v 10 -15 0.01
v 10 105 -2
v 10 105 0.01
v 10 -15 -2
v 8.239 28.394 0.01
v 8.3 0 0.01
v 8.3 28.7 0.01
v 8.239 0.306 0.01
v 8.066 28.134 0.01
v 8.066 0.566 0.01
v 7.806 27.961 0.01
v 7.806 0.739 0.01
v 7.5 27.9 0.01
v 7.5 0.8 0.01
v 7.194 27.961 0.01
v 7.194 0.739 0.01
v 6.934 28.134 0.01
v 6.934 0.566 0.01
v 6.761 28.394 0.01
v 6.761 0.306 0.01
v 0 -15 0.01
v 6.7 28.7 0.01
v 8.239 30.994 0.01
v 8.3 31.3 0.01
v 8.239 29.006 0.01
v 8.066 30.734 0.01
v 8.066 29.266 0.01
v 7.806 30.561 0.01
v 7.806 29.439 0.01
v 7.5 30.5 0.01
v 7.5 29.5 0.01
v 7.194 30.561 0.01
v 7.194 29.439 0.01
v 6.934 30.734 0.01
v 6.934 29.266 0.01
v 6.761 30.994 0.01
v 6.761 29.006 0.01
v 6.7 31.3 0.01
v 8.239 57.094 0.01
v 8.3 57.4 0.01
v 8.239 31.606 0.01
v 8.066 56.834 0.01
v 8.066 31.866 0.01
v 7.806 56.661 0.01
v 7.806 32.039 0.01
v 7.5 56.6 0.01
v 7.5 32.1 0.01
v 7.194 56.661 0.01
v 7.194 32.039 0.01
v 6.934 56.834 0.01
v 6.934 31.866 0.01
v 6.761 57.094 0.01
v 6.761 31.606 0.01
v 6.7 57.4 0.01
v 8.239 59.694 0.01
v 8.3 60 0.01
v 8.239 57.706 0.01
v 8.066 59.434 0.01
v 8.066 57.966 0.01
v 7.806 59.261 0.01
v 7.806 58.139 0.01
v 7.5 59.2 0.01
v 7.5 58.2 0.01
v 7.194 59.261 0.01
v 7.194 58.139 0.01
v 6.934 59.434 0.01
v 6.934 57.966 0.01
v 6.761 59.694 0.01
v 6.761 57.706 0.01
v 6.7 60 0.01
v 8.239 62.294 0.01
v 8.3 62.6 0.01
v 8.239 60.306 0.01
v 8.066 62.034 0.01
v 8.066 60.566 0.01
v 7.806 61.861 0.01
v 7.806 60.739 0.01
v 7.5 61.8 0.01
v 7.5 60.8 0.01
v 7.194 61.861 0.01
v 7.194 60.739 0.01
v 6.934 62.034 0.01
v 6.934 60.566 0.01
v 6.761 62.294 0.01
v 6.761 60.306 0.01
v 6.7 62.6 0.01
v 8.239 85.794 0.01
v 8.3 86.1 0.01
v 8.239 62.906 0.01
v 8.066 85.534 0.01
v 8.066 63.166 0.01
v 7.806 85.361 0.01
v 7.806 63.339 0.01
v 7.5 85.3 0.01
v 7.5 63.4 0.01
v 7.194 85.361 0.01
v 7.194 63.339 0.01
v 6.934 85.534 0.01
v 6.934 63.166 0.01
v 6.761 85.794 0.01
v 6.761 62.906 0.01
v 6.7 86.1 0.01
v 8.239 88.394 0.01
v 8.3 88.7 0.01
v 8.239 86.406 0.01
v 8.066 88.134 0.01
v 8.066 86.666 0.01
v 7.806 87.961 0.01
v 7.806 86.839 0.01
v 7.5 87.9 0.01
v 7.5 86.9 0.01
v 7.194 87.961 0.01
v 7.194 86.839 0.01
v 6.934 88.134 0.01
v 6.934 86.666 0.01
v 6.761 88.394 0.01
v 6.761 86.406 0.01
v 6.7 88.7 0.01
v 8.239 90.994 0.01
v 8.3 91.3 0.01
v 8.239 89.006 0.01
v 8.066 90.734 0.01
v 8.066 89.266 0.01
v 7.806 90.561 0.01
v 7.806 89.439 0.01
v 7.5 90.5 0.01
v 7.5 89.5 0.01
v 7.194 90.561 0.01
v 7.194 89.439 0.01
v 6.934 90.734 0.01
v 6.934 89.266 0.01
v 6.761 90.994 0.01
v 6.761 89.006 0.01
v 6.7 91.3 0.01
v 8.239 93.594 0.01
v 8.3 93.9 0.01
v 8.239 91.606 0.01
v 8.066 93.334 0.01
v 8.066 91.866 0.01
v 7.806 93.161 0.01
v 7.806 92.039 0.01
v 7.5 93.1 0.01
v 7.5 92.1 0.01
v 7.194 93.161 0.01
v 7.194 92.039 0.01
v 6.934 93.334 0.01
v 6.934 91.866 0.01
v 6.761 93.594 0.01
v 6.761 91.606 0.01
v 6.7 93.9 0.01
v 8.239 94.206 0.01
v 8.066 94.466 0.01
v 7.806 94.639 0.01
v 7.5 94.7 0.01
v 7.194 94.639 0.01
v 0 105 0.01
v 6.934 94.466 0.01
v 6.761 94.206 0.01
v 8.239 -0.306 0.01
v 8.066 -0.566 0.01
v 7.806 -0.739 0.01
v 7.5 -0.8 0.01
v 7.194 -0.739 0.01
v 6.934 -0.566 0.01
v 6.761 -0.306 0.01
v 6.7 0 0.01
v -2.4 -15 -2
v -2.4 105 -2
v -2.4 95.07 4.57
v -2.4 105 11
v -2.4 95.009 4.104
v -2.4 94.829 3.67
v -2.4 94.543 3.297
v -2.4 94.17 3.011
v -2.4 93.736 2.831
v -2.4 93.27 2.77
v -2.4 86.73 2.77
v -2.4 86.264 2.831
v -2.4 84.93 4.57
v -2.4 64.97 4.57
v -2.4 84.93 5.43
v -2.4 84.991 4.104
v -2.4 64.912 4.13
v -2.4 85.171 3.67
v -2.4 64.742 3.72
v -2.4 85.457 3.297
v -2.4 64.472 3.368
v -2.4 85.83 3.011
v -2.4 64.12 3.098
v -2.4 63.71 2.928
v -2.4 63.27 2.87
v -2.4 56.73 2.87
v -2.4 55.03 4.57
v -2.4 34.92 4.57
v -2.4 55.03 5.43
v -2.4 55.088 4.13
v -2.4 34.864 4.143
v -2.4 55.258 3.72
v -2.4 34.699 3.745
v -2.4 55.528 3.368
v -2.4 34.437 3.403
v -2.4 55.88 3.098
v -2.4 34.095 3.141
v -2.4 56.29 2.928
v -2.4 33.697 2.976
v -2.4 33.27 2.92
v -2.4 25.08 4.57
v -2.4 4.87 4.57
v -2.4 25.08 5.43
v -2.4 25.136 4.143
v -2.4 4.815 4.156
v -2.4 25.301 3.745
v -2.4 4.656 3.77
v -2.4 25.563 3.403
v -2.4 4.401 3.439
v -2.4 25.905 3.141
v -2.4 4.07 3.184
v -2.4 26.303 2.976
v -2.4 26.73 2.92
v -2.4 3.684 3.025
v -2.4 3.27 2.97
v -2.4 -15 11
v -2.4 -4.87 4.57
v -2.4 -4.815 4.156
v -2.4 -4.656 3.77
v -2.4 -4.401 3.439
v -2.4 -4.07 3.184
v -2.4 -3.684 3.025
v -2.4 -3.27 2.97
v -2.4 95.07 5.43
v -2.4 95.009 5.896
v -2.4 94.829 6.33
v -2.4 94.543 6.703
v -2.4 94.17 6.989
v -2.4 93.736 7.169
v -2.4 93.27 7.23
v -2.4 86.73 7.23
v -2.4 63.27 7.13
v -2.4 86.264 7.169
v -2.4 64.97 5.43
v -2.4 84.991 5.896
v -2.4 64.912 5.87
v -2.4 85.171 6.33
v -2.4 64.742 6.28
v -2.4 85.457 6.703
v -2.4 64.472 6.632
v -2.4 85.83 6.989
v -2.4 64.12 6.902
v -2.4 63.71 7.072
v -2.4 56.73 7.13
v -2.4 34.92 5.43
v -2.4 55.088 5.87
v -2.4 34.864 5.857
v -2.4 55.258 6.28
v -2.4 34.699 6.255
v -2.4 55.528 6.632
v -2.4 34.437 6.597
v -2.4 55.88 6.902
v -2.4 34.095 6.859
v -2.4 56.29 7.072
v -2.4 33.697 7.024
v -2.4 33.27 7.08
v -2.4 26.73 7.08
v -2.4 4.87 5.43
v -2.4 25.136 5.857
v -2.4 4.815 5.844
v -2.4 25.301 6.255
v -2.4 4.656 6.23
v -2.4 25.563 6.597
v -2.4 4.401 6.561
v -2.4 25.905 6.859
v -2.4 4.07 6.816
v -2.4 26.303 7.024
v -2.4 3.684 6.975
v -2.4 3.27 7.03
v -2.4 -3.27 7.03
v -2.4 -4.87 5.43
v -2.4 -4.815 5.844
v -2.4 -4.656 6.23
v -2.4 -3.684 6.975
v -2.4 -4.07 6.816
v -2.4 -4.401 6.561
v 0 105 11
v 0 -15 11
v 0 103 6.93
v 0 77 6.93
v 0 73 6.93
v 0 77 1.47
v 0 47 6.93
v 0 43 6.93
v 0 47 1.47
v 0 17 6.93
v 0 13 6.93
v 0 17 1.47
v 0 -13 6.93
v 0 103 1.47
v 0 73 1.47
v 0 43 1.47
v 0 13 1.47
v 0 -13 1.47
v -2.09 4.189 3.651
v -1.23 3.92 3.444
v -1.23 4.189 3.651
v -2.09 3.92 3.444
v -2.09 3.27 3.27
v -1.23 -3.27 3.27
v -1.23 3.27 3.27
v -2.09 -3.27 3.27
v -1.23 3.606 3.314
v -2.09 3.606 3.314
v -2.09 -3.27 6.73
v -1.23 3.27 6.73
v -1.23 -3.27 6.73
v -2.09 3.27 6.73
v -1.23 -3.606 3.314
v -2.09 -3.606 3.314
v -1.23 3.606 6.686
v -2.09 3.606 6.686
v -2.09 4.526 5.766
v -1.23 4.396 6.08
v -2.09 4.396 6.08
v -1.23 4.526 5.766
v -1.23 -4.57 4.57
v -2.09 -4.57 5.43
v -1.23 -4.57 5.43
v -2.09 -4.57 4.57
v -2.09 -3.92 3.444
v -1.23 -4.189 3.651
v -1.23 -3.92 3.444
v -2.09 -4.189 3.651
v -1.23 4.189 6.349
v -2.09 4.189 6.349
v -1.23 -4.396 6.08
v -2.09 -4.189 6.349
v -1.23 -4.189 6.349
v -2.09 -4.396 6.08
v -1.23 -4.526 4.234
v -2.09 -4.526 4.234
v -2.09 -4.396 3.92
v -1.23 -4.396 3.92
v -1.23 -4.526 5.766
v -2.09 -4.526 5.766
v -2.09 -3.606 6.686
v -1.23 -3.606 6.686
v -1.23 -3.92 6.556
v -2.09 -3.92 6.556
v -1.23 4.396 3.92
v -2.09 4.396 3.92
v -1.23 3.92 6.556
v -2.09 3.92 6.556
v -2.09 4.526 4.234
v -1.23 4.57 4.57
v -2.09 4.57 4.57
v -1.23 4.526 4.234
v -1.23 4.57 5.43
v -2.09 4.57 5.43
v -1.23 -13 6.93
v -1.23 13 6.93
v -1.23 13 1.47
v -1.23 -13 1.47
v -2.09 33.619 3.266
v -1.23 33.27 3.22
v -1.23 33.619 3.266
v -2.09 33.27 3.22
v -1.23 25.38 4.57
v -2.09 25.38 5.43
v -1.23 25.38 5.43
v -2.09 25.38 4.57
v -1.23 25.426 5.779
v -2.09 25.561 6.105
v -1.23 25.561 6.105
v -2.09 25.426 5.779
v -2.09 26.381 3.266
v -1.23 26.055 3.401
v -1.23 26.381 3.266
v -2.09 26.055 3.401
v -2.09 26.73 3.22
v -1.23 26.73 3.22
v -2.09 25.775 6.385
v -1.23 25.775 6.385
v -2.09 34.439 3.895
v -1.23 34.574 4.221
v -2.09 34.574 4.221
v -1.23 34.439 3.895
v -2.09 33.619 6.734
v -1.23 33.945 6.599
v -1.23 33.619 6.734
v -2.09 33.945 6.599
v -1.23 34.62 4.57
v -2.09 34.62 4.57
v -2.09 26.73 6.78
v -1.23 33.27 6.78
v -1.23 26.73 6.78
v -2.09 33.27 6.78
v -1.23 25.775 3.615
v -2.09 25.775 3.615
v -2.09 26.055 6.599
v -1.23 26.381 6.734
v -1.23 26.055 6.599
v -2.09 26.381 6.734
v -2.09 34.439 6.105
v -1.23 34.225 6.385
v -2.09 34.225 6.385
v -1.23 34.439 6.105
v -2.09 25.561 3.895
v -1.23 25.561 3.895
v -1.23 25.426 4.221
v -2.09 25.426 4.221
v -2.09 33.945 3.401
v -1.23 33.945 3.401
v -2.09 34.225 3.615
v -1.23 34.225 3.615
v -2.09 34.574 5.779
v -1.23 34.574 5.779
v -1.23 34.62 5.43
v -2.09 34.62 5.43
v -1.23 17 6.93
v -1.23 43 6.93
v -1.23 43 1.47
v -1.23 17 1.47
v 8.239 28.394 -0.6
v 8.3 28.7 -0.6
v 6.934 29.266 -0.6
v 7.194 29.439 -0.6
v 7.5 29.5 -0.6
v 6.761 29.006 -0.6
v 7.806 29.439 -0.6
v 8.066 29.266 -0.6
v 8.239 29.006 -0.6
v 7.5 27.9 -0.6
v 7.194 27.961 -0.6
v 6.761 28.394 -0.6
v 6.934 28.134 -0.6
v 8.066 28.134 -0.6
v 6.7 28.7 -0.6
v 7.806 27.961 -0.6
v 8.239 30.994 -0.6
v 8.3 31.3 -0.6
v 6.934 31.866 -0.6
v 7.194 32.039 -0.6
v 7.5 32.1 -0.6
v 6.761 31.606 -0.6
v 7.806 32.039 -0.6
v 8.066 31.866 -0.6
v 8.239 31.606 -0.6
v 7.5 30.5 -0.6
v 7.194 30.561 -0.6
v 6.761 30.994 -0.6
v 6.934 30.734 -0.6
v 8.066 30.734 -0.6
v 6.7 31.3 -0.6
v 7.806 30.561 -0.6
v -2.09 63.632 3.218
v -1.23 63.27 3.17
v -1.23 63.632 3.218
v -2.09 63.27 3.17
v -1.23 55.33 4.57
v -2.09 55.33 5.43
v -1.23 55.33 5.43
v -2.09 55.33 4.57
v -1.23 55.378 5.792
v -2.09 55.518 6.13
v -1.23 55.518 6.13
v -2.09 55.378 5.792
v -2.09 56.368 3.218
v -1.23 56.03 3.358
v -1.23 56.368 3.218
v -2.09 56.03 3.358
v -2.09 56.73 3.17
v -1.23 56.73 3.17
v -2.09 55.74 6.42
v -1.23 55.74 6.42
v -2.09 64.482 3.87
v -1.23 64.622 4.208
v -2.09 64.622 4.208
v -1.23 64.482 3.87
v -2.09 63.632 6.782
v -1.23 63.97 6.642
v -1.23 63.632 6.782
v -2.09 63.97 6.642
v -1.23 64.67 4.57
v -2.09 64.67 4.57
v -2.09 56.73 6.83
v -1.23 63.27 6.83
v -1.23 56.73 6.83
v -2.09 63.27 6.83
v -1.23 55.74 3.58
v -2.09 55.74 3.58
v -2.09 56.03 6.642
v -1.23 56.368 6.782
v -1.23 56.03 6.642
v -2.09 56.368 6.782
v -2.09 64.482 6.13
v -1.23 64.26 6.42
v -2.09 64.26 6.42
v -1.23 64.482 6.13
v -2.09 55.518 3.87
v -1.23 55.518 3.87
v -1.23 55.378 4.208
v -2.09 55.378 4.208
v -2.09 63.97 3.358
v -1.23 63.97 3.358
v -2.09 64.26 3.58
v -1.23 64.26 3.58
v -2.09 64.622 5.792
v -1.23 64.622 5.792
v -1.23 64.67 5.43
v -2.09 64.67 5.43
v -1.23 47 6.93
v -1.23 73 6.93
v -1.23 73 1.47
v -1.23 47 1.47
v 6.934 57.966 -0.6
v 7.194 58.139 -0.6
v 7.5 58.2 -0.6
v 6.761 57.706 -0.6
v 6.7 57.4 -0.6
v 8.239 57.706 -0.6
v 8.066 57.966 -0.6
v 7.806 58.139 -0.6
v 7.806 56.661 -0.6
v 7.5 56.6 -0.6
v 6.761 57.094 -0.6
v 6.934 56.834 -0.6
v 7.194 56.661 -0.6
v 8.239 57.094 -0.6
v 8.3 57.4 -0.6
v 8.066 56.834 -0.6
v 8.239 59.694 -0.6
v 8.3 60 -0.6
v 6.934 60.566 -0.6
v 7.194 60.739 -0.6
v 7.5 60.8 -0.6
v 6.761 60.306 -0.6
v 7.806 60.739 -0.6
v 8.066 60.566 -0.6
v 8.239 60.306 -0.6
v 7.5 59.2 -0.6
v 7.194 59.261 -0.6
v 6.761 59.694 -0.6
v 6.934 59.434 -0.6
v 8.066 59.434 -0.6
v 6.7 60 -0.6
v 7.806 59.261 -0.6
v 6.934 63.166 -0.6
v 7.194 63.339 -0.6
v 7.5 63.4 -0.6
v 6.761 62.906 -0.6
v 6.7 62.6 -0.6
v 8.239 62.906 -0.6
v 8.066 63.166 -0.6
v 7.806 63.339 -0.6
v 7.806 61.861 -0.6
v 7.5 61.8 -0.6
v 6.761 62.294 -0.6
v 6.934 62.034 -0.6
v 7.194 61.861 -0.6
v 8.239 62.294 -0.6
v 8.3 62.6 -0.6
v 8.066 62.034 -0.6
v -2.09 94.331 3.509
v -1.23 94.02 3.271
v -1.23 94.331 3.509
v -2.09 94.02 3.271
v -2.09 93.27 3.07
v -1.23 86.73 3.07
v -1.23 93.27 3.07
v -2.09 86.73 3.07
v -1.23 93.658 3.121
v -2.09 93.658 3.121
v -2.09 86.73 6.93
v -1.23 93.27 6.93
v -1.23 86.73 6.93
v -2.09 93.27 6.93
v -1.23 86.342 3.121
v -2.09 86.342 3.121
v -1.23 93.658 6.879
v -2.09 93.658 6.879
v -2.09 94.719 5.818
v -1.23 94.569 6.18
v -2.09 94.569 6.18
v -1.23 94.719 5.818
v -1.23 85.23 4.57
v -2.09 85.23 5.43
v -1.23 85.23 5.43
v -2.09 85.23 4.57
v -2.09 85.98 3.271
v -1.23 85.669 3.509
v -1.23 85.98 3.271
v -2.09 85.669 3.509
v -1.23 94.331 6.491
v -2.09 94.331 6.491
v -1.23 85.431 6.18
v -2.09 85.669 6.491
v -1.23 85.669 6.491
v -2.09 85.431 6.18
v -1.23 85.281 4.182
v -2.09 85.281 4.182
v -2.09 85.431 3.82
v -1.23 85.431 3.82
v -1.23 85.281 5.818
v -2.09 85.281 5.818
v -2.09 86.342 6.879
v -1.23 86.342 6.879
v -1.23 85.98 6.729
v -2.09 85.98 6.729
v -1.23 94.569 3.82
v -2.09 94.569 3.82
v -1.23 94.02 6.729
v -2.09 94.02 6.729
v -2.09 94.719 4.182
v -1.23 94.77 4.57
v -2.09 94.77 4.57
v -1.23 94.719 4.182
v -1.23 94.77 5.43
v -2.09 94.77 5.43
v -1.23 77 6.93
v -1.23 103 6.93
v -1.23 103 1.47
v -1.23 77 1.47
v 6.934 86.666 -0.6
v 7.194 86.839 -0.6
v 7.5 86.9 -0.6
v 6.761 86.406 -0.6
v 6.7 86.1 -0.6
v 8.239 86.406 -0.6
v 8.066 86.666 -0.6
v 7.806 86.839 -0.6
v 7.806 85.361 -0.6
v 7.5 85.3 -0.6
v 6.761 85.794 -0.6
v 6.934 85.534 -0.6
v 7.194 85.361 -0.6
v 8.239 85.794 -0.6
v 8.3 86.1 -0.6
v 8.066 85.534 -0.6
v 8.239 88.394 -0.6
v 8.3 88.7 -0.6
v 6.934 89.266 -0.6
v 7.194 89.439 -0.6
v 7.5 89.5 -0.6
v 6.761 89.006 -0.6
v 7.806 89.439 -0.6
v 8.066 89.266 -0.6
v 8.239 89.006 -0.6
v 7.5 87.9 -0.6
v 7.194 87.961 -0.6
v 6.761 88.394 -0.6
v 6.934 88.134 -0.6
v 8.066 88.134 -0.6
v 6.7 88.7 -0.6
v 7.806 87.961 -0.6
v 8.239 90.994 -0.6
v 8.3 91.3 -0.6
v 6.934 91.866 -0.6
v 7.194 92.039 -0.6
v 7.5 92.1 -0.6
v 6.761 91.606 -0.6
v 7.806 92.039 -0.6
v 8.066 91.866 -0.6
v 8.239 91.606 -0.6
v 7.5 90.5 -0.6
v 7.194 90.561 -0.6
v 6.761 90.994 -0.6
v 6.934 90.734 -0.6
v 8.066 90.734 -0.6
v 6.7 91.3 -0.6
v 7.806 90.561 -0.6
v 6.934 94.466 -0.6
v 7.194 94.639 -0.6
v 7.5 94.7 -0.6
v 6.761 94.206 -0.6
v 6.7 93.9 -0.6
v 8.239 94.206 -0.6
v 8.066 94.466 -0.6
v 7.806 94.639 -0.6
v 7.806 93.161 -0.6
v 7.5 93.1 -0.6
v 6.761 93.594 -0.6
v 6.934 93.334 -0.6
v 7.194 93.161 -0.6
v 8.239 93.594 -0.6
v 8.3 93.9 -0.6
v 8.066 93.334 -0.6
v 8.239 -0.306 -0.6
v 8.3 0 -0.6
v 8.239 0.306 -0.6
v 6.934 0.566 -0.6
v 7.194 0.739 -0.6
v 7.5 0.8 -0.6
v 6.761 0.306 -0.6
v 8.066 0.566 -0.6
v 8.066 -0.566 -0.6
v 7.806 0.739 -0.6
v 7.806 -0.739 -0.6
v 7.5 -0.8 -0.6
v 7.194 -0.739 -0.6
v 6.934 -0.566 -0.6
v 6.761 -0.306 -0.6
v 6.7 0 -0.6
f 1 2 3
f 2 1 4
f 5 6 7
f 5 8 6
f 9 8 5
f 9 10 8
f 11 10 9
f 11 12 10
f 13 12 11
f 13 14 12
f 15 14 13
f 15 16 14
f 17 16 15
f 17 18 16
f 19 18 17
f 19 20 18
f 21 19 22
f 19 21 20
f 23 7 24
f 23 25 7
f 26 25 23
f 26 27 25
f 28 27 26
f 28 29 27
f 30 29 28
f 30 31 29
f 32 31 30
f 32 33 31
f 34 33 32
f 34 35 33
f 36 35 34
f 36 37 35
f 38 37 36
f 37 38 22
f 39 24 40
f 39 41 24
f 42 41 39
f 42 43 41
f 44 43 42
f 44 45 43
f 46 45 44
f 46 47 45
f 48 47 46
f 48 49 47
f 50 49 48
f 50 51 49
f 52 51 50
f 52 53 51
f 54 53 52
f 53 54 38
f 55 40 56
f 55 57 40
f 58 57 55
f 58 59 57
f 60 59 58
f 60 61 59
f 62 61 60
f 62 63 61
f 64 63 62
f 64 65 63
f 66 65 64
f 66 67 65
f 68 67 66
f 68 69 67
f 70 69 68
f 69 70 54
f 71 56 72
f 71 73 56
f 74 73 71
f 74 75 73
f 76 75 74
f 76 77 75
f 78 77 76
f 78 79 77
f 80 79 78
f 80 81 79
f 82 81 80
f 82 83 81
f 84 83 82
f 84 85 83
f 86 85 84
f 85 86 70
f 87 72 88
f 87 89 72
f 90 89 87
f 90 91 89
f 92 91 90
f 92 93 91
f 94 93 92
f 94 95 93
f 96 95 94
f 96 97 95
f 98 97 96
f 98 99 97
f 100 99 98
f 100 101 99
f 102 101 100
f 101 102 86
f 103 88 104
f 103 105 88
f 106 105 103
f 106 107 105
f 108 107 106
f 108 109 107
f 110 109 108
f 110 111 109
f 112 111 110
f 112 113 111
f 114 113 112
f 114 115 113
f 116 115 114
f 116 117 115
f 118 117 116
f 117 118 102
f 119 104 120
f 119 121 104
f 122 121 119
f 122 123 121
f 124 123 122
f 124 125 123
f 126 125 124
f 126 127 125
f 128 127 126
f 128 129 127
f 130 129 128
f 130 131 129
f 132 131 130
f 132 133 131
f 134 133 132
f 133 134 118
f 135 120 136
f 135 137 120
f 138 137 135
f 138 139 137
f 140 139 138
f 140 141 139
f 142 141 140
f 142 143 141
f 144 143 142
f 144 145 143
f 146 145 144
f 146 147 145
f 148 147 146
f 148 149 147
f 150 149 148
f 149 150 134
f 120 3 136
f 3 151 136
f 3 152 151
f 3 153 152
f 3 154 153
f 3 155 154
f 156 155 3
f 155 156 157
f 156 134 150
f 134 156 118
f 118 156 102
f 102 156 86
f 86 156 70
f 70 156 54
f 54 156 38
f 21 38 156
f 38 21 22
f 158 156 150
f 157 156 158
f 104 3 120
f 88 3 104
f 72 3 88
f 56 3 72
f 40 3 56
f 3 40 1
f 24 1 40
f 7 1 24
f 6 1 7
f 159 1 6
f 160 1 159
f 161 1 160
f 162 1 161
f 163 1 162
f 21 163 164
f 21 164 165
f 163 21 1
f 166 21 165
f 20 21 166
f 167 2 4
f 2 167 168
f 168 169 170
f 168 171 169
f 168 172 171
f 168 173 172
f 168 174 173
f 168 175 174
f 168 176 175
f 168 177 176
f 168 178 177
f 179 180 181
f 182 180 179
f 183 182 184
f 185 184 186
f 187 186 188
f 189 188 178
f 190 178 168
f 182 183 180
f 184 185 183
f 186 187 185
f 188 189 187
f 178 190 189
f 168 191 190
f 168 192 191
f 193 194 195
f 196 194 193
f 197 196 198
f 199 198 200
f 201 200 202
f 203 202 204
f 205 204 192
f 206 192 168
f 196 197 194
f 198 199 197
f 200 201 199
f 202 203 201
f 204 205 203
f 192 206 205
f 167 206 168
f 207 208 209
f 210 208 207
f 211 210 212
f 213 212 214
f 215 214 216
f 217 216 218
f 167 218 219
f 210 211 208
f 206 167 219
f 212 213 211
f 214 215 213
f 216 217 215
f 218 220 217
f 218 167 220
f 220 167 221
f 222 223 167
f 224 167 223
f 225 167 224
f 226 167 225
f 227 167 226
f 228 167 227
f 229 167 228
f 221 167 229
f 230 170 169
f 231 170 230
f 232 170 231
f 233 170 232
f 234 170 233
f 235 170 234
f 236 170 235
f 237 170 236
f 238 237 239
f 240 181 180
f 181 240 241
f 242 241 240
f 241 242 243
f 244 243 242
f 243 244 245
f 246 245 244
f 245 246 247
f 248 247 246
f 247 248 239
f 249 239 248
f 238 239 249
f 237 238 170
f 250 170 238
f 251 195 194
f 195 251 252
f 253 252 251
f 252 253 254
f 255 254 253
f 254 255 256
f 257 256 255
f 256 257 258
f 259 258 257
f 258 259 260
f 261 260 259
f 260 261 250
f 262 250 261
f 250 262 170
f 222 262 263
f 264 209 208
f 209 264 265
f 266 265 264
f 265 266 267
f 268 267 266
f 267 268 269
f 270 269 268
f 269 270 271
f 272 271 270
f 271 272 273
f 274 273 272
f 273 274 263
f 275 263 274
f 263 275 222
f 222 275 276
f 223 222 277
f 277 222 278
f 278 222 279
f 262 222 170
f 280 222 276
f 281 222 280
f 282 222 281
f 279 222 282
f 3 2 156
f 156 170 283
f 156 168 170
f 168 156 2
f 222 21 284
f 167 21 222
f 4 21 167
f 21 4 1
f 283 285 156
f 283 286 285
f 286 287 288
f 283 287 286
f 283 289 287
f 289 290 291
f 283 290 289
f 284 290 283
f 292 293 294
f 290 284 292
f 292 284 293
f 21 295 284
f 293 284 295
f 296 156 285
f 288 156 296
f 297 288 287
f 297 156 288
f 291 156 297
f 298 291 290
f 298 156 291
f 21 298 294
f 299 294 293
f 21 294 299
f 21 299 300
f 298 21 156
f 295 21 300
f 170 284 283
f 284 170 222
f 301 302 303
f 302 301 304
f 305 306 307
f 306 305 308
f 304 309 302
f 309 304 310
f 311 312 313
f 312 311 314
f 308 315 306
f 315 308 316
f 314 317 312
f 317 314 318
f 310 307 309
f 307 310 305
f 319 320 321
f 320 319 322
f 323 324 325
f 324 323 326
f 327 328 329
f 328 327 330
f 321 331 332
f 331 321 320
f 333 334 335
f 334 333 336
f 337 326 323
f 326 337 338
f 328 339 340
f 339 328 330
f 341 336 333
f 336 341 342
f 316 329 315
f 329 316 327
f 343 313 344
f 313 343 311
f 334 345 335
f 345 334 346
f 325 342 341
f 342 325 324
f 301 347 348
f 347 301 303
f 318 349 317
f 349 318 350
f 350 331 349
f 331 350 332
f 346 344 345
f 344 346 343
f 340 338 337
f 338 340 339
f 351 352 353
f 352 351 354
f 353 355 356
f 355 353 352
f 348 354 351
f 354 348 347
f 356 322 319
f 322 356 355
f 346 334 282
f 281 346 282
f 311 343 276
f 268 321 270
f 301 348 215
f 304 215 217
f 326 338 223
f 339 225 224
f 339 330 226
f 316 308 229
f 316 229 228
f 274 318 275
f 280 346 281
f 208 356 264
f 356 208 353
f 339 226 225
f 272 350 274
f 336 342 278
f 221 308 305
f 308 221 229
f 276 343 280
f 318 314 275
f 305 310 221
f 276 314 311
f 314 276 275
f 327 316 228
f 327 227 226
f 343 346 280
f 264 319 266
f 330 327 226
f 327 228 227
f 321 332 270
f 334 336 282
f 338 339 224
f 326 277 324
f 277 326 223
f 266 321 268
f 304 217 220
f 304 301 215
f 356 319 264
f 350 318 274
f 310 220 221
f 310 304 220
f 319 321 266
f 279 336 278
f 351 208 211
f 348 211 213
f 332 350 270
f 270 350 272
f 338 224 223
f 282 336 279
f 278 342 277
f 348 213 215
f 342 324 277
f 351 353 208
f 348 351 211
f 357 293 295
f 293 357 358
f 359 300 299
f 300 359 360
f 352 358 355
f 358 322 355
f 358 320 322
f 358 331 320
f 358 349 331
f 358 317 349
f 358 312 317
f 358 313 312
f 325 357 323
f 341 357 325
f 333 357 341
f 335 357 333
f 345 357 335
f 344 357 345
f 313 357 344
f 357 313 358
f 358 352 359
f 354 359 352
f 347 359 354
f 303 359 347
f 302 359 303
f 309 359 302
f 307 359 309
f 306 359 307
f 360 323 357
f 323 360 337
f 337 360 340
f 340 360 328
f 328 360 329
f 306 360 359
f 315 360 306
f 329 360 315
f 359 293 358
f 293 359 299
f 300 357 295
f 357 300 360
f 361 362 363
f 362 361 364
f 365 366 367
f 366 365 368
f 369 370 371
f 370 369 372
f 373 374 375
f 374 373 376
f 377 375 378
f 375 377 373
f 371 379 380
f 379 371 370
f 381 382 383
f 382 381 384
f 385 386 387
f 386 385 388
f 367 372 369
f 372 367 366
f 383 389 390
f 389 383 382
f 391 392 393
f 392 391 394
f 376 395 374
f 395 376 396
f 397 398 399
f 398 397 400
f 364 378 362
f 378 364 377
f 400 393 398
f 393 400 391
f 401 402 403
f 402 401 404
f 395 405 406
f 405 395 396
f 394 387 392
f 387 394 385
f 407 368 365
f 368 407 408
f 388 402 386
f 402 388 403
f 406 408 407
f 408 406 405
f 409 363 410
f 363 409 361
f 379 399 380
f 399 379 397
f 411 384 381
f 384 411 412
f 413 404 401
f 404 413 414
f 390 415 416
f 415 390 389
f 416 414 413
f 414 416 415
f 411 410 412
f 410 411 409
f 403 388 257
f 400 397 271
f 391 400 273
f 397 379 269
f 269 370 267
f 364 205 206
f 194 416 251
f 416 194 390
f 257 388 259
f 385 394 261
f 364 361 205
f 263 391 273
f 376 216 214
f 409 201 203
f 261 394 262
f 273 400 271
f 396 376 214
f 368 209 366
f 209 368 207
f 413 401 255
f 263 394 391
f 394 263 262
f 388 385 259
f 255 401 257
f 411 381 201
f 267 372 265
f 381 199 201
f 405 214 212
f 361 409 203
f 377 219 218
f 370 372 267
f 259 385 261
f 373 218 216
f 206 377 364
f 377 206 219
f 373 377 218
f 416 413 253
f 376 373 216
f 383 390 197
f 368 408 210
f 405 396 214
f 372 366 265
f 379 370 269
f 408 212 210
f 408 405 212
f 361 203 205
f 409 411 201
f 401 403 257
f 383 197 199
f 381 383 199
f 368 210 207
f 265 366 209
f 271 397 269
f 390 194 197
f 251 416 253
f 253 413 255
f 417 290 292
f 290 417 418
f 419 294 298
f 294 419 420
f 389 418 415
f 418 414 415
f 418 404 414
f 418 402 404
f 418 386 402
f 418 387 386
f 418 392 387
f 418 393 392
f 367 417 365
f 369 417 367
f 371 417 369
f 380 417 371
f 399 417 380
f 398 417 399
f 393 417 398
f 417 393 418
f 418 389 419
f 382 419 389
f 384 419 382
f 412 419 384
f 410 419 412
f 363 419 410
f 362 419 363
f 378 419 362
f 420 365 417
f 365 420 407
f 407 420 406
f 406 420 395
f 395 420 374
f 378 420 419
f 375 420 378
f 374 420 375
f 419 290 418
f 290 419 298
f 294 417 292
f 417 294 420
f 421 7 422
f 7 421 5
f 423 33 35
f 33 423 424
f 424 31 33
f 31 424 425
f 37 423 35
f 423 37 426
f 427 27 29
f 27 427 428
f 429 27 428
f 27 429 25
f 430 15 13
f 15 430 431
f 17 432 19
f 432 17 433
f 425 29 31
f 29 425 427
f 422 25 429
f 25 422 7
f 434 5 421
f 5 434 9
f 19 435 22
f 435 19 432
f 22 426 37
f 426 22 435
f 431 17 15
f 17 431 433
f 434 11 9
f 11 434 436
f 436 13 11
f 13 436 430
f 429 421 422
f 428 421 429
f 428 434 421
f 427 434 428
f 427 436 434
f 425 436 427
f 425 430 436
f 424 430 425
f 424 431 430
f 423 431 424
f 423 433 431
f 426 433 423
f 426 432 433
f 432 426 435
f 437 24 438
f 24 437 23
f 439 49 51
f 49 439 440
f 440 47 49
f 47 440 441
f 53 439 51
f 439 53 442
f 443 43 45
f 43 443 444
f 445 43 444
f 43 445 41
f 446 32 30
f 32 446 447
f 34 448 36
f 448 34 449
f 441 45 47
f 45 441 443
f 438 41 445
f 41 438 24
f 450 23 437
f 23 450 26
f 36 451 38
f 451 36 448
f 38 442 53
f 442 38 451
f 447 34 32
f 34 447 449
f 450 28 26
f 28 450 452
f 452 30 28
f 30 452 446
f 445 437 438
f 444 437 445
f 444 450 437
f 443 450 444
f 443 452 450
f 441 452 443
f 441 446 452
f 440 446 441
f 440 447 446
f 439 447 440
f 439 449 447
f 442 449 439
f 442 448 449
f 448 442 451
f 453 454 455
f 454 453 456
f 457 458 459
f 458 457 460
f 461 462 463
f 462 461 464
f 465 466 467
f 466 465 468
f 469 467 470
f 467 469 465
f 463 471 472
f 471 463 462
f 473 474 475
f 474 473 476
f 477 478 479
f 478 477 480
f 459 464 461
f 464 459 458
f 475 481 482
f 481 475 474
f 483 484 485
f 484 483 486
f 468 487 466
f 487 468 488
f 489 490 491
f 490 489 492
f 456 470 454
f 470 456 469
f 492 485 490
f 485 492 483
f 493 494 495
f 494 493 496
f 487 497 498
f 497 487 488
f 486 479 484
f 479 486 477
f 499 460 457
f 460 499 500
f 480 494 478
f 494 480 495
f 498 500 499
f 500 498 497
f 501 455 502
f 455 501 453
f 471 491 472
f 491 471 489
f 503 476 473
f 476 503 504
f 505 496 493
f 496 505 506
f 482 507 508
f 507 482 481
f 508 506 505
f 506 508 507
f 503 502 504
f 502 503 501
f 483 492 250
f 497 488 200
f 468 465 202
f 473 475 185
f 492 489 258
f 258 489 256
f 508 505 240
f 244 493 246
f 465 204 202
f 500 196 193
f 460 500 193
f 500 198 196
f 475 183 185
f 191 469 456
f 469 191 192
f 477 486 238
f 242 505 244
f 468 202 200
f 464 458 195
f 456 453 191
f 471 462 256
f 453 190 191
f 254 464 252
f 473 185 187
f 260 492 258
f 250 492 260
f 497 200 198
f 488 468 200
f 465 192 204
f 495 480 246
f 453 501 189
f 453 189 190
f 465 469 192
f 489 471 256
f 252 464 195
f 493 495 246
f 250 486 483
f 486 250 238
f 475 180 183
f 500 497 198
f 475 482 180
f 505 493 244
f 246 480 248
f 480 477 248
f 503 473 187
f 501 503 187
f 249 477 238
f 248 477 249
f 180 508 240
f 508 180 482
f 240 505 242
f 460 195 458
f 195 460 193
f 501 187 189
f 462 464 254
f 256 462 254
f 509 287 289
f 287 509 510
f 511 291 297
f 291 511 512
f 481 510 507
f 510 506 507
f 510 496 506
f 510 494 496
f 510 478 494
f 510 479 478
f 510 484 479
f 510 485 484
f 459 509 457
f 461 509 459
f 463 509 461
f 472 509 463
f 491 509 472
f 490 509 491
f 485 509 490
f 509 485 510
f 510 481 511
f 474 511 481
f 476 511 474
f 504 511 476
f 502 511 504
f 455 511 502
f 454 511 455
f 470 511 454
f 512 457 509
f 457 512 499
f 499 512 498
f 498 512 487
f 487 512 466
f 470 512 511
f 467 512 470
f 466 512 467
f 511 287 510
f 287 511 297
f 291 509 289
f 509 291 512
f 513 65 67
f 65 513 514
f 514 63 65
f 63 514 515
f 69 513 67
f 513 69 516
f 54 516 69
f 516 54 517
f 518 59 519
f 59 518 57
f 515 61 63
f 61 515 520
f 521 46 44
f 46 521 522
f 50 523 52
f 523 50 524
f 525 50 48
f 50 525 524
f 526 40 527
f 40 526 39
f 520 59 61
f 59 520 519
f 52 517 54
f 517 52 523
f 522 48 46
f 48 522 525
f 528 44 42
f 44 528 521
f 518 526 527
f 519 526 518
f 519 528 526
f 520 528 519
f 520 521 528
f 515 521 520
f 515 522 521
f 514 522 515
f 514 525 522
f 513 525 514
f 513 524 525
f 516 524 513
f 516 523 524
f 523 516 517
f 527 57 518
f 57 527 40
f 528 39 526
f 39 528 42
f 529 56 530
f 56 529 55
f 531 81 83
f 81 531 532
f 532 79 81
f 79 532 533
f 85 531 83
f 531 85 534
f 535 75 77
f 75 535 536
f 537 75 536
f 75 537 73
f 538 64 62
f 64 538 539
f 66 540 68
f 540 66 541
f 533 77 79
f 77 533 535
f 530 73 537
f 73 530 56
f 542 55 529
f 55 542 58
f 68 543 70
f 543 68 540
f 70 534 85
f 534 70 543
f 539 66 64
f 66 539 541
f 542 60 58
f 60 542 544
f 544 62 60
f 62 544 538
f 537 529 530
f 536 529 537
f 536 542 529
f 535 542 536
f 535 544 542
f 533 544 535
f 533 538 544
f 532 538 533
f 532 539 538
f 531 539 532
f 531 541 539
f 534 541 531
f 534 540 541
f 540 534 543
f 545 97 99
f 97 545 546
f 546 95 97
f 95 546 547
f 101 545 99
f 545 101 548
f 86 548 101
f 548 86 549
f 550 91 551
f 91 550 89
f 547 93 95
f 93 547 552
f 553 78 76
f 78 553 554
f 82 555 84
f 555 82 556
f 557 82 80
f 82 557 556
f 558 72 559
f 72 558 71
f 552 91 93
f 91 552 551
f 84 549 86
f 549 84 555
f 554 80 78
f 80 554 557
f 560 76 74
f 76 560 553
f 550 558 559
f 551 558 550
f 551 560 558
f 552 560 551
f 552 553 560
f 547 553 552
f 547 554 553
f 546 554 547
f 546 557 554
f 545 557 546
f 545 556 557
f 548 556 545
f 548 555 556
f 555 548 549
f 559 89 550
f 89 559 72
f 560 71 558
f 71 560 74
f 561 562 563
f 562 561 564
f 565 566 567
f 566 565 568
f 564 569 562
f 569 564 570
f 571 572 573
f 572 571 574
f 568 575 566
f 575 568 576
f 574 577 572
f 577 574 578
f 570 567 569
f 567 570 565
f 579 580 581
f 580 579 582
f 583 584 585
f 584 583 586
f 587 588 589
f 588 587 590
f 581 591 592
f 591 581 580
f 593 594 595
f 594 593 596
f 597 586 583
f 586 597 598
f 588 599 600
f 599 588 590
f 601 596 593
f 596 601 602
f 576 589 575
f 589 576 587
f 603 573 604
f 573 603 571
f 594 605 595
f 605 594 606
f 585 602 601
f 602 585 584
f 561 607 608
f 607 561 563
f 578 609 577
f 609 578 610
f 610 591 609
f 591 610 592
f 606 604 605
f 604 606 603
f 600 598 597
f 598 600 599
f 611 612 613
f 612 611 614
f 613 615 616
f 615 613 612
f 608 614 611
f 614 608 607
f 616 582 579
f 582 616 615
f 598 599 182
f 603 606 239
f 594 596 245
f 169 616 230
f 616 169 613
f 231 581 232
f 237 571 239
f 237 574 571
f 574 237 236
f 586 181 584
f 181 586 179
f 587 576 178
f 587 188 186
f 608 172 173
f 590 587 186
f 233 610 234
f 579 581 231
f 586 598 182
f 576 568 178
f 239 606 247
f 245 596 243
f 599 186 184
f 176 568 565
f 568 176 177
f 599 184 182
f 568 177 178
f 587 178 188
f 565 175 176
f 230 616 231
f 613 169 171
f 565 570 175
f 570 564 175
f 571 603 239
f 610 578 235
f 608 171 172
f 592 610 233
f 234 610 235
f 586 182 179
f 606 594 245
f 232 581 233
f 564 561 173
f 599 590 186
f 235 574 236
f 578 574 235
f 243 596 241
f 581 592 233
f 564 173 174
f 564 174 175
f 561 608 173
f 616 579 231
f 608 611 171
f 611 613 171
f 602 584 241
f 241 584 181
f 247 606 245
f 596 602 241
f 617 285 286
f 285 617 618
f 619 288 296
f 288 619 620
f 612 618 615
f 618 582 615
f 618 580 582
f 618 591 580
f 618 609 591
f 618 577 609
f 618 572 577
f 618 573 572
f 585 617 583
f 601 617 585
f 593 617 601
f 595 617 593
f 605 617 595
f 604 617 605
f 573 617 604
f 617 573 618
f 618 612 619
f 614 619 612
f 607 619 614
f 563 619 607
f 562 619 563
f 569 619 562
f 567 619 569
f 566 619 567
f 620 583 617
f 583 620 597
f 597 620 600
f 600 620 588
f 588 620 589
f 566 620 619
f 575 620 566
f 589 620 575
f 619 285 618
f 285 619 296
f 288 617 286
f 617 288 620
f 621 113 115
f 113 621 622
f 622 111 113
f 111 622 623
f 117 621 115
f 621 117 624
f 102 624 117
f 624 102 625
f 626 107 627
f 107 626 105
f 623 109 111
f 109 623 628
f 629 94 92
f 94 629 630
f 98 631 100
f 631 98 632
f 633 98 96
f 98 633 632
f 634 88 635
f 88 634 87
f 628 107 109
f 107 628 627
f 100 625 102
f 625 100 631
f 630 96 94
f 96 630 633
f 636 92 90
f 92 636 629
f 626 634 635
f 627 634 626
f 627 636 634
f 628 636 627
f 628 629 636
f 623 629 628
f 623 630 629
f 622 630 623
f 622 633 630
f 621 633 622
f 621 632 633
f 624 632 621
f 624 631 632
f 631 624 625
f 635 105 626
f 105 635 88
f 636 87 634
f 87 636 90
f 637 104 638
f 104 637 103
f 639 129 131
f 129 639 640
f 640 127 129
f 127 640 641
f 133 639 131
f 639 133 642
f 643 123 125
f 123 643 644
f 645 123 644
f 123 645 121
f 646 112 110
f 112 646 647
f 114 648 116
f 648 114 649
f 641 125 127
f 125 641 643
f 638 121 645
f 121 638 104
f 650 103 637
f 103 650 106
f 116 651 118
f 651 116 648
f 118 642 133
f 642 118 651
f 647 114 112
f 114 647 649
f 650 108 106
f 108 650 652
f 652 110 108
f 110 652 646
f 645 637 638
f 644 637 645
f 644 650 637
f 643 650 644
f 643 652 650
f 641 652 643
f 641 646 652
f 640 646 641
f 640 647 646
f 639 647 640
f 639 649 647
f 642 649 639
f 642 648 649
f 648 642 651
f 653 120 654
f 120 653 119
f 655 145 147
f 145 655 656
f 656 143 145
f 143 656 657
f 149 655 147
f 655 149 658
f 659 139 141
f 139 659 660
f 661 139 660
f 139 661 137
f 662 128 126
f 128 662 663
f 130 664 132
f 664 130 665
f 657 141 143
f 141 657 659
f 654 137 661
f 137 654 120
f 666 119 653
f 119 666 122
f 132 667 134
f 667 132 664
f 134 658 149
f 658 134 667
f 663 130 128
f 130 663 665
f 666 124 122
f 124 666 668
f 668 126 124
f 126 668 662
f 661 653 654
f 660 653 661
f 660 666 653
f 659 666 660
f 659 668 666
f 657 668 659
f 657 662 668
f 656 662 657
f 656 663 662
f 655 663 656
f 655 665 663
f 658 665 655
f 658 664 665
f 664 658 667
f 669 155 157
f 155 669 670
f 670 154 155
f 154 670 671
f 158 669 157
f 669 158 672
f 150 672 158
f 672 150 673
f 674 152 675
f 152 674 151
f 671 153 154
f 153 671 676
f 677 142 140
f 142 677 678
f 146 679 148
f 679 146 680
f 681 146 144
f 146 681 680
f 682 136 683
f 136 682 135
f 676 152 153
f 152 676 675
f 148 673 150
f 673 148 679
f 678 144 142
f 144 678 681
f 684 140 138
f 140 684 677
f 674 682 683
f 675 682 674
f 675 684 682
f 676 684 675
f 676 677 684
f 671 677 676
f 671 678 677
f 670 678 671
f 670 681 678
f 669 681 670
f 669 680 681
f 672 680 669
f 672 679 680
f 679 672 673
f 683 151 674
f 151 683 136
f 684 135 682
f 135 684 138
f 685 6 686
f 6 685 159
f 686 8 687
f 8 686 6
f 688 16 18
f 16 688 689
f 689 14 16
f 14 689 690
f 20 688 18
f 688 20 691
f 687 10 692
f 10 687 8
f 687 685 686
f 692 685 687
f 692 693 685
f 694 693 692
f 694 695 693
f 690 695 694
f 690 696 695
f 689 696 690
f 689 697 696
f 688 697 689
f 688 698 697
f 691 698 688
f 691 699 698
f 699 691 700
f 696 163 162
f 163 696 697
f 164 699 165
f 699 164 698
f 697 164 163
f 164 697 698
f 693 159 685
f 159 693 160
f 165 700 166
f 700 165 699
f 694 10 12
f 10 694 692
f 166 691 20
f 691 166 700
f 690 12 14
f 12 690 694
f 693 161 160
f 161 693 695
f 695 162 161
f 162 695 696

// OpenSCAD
// file: ../../util/marks.scad
//-----------------------------------------------------------------------
// Marks for fit pieces: n dots in a row, engraved into a face, so each
// variant can be told apart after printing. Origin: centre of the row, on
// the face; the dots cut down into -Z. Units: mm.
//-----------------------------------------------------------------------

markDotDia   = 1.6;
markDotPitch = 2.6;
markDotDepth = 0.6;

module markDots(n)
{
  for (i = [0 : n - 1])
    translate([(i - (n - 1)/2)*markDotPitch, 0, -markDotDepth])
      cylinder(d = markDotDia, h = markDotDepth + 1, $fn = 16);
}
// file: usb-c-port.scad
//-----------------------------------------------------------------------
// USB-C port through a wall, flush: the socket's metal shell sits in a
// close-fitting pocket in the wall, walled in on all four sides, its face
// level with the outside. The cable seats the way it does on a laptop.
//
// A board's socket only overhangs the board edge by a mm or so, less than
// the wall. So the board's end tucks into a shallow relief in the wall's
// inner face, the width of the board, leaving the wall round the socket
// thin enough for the face to reach the outside. When that would leave less
// than usbcMinWall (a socket that barely overhangs), the face sits back from
// the outside instead: usbcRecess() says how far.
//
// Modules, all in the same frame:
//   usbcGhost()     the socket and the board's end, for previews
//   usbcWallCut()   subtract from the wall: socket pocket and board relief
//
// Frame: origin on the floor top at the wall's inner face, under the socket's
// axis. +X into the box, Z up. The wall is X = -wall .. 0. The board is
// component side up, socket on top (top-mount, as on the FireBeetle, C3 Super
// Mini and S3 DevKitC). Units: mm.
//
// usbcBoardEdgeX() gives where the board's edge lands (negative: inside the
// wall), so a holder can put its posts or pocket to match.
//-----------------------------------------------------------------------

//-- The socket: USB-C receptacle shell (USB-IF 8.34 x 2.56 plug, receptacle shell ~8.94 x 3.26)
usbcShellW     = 8.94;
usbcShellH     = 3.26;    // CAL per board: measured 3.2 on the FireBeetle
usbcShellR     = 1.2;     // CAL: end radius. Full round would be 1.63; most shells are squarer
usbcShellDepth = 7.35;    // face to back

//-- The pocket
usbcClearance  = 0.15;    // CAL: per side, shell to pocket. Set by the fit piece
usbcMinWall    = 1.0;     // thinnest wall left round the socket
usbcReliefGap  = 0.3;     // board relief over the board, each side and above/below
usbcChamfer    = 0.3;     // lead-in on the outside edge

//-- How far the socket face sits back from the outside: 0 (flush) unless the socket
//-- overhangs the board edge by less than usbcMinWall
function usbcRecess(overhang, minWall = usbcMinWall) = max(0, minWall - overhang);
//-- X of the board's socket edge in this frame
function usbcBoardEdgeX(wall, overhang, recess) =
  -wall + (is_undef(recess) ? usbcRecess(overhang) : recess) + overhang;
//-- Z of the board's underside above the floor top
function usbcBoardZ(axisZ, pcb, shellH = usbcShellH) = axisZ - shellH/2 - pcb;

module usbcShell2D(grow = 0, w = usbcShellW, h = usbcShellH, r = usbcShellR)
{
  offset(r = r + grow, $fn = 24) square([w - 2*r, h - 2*r], center = true);
}

//-- axisZ: socket axis above the floor. boardW/pcb: the board, for the ghost and relief.
//-- shift: socket centre across the board's width from the board's centre line (+Y)
module usbcGhost(axisZ, wall, overhang, boardW, pcb = 1.6, recess, shift = 0, shellH = usbcShellH, shellW = usbcShellW)
{
  ex = usbcBoardEdgeX(wall, overhang, recess);
  %color("Silver") translate([ex - overhang, 0, axisZ]) rotate([0, 90, 0]) rotate([0, 0, 90])
    linear_extrude(usbcShellDepth) usbcShell2D(w = shellW, h = shellH);
  %color("DarkSlateGray") translate([ex, -boardW/2 - shift, usbcBoardZ(axisZ, pcb, shellH)]) cube([12, boardW, pcb]);
}

module usbcWallCut(axisZ, wall, overhang, boardW, pcb = 1.6, recess, shift = 0,
                   clearance = usbcClearance, shellH = usbcShellH, shellW = usbcShellW, aboveBoard)
{
  rc = is_undef(recess) ? usbcRecess(overhang) : recess;
  ex = usbcBoardEdgeX(wall, overhang, rc);
  bz = usbcBoardZ(axisZ, pcb, shellH);
  //-- what stands on the board near its edge: the socket, unless told taller
  up = is_undef(aboveBoard) ? shellH : aboveBoard;
  assert(ex - overhang + wall >= -0.01, "socket face would stand proud of the wall");
  assert(rc > 0 || overhang >= usbcMinWall - 0.01, "wall round the socket under usbcMinWall");
  //-- socket pocket, through the wall
  translate([-wall - 1, 0, axisZ]) rotate([0, 90, 0]) rotate([0, 0, 90])
    linear_extrude(wall + 2) usbcShell2D(clearance, w = shellW, h = shellH);
  //-- lead-in chamfer on the outside
  translate([-wall, 0, axisZ]) rotate([0, 90, 0]) rotate([0, 0, 90])
    hull()
    {
      translate([0, 0, -0.01]) linear_extrude(0.01) usbcShell2D(clearance + usbcChamfer, w = shellW, h = shellH);
      translate([0, 0, usbcChamfer]) linear_extrude(0.01) usbcShell2D(clearance, w = shellW, h = shellH);
    }
  //-- board relief in the inner face, when the board's edge lands inside the wall
  if (ex < 0)
    translate([ex - usbcReliefGap, -boardW/2 - shift - usbcReliefGap, bz - usbcReliefGap])
      cube([-ex + usbcReliefGap + 1, boardW + 2*usbcReliefGap, pcb + up + 2*usbcReliefGap]);
}
// main file
//-----------------------------------------------------------------------
// Fit piece: a strip of wall with four USB-C pockets, each with the relief
// for a board's end behind it, marked 1 to 4 dots. Hold a board level on
// the floor strip and slide its socket into each pocket from behind: it
// should go in with a light push, not rattle, and finish flush outside.
// Then plug a cable in from the front: it should seat fully.
//
//   1  0.10 per side
//   2  0.15 per side
//   3  0.20 per side
//   4  0.30 per side
//
// Set overhang/boardW/pcb to the board you'll test with (FireBeetle below;
// the relief is wide enough for the C3 Super Mini too).
// Prints base down, as exported, no supports. Units: mm.
//-----------------------------------------------------------------------

use <usb-c-port.scad>
use <../../util/marks.scad>

wall      = 2.4;
overhang  = 1.47;     // FireBeetle 2 ESP32-E; C3 Super Mini 1.5
boardW    = 25.4;
pcb       = 1.6;
axisZ     = 5;        // socket axis above the floor: board on 1.8 of packing
baseThick = 2.0;
pitch     = 30;
clears    = [0.10, 0.15, 0.20, 0.30];

n     = len(clears);
wallH = axisZ + 6;
depth = 10;

difference()
{
  union()
  {
    translate([-wall, -pitch/2, -baseThick]) cube([wall + depth, n*pitch, baseThick + 0.01]);
    translate([-wall, -pitch/2, 0]) cube([wall, n*pitch, wallH]);
  }
  for (i = [0 : n - 1])
  {
    translate([0, i*pitch, 0]) usbcWallCut(axisZ, wall, overhang, boardW, pcb, clearance = clears[i]);
    translate([depth - 2.5, i*pitch, 0]) rotate([0, 0, 90]) markDots(i + 1);
  }
}

if ($preview)
  for (i = [0 : n - 1]) translate([0, i*pitch, 0]) usbcGhost(axisZ, wall, overhang, boardW, pcb);
